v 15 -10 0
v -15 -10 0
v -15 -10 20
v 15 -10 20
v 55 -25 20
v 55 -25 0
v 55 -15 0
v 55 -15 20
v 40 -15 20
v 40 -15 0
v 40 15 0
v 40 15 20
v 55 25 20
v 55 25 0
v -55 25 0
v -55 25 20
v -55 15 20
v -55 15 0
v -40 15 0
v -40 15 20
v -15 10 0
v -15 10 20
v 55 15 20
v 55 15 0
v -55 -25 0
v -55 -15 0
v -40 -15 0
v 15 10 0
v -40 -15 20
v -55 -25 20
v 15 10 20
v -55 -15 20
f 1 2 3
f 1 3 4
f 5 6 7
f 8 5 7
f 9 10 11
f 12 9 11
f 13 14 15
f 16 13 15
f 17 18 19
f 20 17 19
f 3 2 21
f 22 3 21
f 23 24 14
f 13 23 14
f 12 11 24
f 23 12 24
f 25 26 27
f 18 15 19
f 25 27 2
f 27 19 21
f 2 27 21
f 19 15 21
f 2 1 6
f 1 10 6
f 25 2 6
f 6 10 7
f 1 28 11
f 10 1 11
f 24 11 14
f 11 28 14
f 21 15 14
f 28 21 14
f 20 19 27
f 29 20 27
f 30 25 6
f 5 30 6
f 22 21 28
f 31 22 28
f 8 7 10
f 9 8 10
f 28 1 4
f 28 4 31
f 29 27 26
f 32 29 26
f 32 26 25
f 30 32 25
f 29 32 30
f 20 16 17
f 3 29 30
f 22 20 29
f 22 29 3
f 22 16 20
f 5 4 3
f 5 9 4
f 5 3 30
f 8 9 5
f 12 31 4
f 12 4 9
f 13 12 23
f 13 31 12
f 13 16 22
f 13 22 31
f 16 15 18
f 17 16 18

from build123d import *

# Parameters (mm, degrees)
SKETCH1_W           = 30
SKETCH1_H           = 20
BOSS_EXTRUDE1_DEPTH = 20


with BuildPart() as part:
    # Sketch1 → Boss-Extrude1 (new body)
    with BuildSketch(Plane.XY):
        Polygon((-40, -25), (40, -25), (55, -25), (55, -15), (40, -15), (40, 15), (55, 15), (55, 25), (40, 25), (-40, 25), (-55, 25), (-55, 15), (-40, 15), (-40, -15), (-55, -15), (-55, -25), align=None)
        Rectangle(SKETCH1_W, SKETCH1_H, mode=Mode.SUBTRACT)
    extrude(amount=BOSS_EXTRUDE1_DEPTH)


solid = part.part
